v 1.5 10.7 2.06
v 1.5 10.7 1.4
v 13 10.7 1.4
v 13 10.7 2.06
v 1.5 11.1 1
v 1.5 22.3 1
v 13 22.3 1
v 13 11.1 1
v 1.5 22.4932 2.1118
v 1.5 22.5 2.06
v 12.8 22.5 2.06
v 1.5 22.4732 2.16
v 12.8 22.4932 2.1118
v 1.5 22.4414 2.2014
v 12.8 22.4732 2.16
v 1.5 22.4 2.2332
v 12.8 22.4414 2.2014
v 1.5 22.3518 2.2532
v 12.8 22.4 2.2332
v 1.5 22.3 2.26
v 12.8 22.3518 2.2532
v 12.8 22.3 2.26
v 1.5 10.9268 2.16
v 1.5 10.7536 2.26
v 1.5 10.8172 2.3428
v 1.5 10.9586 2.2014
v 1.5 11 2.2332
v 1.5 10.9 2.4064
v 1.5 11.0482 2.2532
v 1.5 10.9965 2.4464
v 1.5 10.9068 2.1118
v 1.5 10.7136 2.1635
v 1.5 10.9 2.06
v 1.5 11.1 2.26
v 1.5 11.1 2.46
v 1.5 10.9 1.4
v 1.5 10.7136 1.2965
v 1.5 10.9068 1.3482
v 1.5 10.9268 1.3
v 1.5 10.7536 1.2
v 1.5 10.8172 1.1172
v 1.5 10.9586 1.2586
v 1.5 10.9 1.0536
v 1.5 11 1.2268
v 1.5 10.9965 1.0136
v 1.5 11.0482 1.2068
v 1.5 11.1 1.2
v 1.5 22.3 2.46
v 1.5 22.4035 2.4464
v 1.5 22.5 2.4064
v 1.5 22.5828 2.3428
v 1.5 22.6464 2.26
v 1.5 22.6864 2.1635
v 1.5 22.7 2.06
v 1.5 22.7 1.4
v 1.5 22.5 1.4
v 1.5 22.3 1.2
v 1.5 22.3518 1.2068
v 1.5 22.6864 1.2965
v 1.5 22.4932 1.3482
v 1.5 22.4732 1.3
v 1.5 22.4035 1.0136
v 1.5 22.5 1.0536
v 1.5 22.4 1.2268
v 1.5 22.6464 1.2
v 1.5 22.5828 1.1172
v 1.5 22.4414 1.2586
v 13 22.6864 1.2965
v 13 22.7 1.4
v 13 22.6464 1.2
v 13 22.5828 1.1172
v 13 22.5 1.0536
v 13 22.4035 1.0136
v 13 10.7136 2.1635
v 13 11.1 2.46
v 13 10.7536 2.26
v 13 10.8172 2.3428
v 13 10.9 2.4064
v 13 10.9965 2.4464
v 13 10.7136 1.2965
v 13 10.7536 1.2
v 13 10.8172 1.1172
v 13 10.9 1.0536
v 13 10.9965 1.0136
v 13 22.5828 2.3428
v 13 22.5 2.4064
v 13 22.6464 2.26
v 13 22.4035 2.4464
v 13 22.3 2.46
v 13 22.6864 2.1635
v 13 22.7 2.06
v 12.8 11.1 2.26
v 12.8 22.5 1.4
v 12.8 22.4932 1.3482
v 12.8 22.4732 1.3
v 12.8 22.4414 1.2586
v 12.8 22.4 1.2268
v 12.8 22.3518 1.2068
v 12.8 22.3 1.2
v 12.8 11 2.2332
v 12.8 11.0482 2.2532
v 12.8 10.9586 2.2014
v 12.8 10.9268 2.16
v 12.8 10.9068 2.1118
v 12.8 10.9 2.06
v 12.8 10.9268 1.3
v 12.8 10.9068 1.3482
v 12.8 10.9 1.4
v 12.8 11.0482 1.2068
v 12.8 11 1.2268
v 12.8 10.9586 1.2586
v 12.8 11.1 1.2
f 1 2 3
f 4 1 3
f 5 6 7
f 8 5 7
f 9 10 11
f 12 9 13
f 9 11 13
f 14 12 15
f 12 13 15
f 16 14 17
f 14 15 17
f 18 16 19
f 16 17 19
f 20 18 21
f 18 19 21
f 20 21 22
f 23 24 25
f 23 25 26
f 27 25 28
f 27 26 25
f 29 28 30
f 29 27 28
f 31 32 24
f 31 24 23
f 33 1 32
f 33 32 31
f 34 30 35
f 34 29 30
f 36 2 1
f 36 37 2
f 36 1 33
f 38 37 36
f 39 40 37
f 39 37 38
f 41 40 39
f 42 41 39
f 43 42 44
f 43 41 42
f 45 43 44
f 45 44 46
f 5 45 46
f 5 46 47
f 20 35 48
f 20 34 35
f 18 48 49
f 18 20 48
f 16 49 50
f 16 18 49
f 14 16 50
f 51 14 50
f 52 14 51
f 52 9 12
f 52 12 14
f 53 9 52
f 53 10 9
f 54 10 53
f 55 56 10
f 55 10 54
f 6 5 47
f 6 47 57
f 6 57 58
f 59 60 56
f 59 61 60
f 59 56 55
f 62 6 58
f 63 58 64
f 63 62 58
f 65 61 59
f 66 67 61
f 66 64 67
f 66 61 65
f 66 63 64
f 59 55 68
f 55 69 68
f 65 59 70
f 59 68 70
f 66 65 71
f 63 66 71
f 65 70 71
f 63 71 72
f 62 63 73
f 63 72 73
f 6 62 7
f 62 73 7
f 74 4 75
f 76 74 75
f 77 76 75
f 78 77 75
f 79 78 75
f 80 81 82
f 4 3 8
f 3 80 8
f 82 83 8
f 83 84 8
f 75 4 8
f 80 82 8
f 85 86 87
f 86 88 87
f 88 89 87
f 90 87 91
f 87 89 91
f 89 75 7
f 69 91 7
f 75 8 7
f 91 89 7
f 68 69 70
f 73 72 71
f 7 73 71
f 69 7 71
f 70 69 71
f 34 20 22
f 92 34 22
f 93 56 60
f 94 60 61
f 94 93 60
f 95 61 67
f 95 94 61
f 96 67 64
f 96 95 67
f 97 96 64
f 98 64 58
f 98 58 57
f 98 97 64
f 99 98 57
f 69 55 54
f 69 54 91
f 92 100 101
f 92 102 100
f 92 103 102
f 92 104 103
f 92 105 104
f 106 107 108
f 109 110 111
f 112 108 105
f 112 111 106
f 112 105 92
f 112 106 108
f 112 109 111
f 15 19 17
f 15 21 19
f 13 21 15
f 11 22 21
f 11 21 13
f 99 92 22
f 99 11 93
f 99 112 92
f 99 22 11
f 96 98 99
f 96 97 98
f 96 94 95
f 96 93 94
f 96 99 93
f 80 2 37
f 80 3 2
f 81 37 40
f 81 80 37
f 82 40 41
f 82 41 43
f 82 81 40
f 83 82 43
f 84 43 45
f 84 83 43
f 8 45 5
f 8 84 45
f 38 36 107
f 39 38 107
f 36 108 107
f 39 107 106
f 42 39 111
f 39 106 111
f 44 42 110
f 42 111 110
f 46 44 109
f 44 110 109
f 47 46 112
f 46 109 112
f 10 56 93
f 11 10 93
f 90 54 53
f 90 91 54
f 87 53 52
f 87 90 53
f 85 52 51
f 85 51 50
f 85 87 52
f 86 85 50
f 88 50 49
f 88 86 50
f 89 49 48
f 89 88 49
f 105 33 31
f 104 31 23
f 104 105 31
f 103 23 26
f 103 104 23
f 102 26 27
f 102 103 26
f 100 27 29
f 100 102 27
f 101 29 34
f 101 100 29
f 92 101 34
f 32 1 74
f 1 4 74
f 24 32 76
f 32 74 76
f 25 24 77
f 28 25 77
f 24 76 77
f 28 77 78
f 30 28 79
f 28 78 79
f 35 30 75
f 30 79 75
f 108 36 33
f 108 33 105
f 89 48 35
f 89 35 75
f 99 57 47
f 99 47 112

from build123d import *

# Parameters (mm, degrees)
SKETCH011_W    = 11.5
SKETCH011_H    = 12
PAD008_DEPTH   = 1.46
FILLET003_R    = 0.4
THICKNESS003_T = -0.2


with BuildPart() as part:
    # Sketch011 (on Face1 of ReferenceLinearPattern004004) → Pad008 (new body)
    with BuildSketch(Plane.XY.offset(1)):
        with Locations((7.25, 16.7)):
            Rectangle(SKETCH011_W, SKETCH011_H)
    extrude(amount=PAD008_DEPTH)

    # Fillet003
    fillet003_edges = [part.edges().sort_by_distance(p)[0] for p in [
        (7.25, 10.7, 2.46),
        (7.25, 10.7, 1),
        (7.25, 22.7, 2.46),
        (7.25, 22.7, 1),
    ]]
    fillet(fillet003_edges, radius=FILLET003_R)

    # Thickness003
    thickness003_openings = [part.faces().sort_by_distance(p)[0] for p in [
        (1.5, 16.7, 1.73),
    ]]
    offset(amount=THICKNESS003_T, openings=thickness003_openings)


solid = part.part
